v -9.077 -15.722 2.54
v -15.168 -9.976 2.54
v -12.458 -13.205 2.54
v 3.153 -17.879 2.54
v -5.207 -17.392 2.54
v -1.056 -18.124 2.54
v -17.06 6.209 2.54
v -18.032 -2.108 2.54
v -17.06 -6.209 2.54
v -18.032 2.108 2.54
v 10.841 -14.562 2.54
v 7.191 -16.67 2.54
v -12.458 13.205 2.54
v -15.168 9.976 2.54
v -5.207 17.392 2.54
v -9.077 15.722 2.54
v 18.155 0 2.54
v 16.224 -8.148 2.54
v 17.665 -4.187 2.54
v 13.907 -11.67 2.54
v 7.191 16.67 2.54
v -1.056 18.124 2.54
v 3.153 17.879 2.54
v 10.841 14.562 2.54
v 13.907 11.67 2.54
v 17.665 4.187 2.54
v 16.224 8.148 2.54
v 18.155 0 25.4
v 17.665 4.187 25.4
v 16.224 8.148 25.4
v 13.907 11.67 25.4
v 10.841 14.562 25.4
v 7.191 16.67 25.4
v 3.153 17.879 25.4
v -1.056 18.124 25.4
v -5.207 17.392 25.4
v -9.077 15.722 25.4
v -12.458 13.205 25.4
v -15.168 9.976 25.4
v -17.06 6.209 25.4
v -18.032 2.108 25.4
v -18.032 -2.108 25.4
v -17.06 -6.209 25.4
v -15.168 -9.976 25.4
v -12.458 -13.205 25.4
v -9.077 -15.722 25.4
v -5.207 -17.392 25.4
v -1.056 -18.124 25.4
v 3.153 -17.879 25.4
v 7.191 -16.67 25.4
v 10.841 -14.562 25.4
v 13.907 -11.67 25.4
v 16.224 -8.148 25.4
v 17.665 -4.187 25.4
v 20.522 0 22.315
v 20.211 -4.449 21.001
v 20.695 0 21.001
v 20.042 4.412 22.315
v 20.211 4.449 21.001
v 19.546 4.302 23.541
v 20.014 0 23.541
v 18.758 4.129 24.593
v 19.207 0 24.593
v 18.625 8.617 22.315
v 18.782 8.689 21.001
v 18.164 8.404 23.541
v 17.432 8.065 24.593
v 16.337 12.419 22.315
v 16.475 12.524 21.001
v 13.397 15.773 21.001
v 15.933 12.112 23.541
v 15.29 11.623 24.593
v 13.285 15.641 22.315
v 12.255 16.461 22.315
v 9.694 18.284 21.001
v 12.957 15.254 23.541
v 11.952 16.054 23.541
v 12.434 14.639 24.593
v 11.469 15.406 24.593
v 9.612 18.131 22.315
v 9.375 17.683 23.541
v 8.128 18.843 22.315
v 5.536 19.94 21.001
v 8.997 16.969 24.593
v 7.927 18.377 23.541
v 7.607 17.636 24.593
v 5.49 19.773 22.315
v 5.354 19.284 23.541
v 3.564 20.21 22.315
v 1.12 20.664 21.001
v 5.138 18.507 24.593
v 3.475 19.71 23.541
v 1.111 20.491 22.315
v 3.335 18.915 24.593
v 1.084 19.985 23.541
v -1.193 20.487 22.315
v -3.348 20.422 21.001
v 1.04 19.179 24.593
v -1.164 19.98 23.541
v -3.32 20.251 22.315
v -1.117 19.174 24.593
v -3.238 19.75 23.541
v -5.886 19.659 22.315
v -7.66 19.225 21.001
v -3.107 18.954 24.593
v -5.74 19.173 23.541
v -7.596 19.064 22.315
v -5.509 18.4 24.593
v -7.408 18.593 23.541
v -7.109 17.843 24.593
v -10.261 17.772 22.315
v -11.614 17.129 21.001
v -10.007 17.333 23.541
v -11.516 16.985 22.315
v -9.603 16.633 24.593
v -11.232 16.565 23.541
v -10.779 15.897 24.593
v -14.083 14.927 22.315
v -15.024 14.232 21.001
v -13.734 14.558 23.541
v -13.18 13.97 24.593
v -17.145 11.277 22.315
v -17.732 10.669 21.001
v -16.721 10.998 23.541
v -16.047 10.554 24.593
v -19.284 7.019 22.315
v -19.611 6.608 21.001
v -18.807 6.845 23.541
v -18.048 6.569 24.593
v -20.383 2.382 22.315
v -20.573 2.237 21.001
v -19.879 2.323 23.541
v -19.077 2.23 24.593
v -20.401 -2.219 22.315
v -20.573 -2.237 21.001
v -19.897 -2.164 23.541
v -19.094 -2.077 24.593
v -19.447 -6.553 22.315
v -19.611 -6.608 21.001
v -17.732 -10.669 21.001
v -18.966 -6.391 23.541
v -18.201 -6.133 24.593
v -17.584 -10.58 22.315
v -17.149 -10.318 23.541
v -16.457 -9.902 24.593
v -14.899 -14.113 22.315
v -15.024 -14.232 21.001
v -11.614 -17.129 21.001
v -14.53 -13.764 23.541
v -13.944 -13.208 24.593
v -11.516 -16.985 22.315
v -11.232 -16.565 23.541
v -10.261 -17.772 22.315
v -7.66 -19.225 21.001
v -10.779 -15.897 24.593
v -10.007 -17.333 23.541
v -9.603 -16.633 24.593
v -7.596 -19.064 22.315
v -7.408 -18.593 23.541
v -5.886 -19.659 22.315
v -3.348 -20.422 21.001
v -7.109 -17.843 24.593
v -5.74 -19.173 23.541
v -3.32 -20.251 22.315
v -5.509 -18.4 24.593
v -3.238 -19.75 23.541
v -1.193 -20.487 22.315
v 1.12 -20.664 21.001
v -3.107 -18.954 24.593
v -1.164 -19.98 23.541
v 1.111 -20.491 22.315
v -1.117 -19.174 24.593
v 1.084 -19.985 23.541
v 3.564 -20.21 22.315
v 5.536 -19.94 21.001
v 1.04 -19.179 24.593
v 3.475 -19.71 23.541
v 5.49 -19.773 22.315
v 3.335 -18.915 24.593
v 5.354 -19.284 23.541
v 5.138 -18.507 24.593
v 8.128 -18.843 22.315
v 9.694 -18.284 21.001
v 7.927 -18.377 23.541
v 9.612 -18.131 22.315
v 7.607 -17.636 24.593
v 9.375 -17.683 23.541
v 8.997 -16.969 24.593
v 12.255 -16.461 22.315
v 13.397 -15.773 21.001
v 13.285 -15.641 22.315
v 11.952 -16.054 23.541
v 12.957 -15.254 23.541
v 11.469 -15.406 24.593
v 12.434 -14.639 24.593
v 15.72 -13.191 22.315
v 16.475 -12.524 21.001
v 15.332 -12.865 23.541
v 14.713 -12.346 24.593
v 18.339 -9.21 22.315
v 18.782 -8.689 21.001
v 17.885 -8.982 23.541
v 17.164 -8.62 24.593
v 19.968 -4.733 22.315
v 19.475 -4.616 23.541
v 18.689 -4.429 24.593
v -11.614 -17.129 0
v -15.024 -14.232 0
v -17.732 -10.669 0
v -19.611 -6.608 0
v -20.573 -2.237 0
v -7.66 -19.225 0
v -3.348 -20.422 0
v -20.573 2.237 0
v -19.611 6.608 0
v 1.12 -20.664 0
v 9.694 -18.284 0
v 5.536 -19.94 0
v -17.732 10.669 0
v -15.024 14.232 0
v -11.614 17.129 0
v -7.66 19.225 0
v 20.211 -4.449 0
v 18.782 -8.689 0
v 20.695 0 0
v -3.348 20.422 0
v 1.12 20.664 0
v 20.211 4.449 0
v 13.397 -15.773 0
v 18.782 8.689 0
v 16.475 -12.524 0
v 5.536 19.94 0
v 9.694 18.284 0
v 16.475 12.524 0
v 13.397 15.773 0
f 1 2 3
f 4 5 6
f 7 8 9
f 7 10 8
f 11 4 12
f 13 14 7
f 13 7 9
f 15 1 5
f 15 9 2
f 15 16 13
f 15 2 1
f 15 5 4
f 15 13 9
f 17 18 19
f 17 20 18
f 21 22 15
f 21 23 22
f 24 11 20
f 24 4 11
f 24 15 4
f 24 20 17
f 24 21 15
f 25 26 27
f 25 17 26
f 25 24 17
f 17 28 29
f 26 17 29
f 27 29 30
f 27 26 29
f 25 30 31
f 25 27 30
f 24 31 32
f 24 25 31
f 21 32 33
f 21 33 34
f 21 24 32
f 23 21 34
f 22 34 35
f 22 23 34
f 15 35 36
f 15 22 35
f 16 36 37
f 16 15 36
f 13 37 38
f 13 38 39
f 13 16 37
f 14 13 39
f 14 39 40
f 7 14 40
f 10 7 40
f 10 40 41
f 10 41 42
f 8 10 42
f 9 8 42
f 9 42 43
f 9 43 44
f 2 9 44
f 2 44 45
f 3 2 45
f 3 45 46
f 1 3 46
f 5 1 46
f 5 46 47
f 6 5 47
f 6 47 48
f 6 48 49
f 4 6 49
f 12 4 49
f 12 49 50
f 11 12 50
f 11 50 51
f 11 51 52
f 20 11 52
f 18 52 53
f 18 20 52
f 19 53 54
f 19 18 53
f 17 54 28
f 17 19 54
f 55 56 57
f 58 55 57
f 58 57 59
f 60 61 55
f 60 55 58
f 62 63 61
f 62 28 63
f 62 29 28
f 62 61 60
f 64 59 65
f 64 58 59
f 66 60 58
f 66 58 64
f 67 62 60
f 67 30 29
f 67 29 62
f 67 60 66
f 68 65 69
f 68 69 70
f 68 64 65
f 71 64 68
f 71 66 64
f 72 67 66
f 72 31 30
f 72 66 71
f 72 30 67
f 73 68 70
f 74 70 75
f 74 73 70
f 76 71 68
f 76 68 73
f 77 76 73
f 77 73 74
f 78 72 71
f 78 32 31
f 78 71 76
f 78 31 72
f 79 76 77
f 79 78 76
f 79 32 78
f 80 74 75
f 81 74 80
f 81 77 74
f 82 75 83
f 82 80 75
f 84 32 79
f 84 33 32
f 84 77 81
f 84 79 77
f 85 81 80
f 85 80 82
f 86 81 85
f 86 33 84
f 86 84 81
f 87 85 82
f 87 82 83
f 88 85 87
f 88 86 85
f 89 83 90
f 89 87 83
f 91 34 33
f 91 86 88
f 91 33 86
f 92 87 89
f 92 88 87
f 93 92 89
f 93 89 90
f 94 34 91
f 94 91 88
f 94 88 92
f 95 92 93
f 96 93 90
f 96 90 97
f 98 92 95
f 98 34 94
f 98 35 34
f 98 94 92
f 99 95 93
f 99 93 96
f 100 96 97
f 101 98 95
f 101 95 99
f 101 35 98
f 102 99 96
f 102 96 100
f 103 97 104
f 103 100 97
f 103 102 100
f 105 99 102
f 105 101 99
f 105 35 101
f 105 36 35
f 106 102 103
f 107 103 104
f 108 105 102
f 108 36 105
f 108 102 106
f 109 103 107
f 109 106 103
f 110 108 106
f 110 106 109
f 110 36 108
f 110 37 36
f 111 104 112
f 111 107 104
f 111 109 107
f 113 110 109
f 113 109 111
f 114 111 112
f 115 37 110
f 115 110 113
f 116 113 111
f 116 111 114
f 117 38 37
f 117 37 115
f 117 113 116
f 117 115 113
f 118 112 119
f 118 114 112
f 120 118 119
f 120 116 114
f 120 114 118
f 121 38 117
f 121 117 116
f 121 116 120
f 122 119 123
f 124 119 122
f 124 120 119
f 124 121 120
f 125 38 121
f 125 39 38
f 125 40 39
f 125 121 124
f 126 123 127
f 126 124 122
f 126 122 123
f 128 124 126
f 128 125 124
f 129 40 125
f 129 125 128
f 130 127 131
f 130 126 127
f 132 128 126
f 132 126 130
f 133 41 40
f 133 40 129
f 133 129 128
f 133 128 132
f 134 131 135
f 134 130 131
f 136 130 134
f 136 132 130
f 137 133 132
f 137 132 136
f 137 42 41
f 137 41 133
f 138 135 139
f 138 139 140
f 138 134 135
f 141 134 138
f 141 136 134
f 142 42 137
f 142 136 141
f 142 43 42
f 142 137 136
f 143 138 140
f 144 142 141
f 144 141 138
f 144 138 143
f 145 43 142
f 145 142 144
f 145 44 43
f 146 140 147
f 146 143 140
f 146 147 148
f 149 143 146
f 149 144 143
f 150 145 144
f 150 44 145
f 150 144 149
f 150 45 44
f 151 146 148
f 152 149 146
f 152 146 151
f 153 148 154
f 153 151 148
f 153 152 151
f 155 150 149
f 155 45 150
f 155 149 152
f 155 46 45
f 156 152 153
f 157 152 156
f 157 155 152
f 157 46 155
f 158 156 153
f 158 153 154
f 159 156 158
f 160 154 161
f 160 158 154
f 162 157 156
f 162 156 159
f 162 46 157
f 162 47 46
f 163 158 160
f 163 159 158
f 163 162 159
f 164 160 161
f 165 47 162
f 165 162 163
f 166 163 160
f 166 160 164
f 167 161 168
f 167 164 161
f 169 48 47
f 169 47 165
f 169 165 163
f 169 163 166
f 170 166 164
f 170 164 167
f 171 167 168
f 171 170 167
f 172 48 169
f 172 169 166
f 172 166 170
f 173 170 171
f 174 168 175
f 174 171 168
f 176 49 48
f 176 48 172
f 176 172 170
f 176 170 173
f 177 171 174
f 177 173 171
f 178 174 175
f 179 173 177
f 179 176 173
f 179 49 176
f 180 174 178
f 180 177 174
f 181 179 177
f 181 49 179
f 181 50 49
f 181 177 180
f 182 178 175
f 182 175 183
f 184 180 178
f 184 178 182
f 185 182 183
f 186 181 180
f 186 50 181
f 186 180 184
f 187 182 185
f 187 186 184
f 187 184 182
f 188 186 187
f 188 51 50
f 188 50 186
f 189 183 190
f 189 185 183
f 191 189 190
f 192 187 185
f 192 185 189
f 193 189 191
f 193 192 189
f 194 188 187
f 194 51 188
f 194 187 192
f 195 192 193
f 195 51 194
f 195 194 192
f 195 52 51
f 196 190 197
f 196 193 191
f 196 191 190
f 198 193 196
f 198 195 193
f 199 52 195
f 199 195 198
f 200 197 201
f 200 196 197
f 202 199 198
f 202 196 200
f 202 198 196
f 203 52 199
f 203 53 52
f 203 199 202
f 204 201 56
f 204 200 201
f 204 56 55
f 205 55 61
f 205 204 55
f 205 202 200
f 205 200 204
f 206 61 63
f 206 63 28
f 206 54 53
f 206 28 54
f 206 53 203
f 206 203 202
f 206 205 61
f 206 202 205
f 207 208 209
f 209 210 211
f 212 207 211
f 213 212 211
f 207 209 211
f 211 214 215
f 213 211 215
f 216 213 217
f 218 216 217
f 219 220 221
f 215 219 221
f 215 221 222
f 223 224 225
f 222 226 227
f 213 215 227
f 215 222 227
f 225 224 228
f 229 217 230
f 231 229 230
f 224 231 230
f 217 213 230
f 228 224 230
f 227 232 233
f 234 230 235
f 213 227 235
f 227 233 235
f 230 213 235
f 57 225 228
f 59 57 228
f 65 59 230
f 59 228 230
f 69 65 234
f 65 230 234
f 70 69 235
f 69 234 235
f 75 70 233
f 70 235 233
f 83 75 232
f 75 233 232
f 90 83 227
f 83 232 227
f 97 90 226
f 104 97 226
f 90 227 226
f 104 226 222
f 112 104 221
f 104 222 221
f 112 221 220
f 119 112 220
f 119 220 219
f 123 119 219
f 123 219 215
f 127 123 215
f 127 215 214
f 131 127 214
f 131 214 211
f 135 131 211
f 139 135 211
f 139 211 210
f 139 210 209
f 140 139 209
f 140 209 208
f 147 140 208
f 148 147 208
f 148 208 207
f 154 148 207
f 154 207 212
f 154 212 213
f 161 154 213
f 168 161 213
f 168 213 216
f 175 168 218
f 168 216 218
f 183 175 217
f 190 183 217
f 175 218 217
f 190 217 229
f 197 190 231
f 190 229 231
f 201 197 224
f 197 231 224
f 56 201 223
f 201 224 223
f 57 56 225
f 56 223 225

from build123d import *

# Parameters (mm, degrees)
F0_R     = 20.6945995874
F1_DEPTH = 25.4
F2_T     = -2.54


# Not quite as in the source:
# - a fillet or chamfer that OpenCascade refuses, or shapes differently, is made with other operations: its cross-section is extruded or revolved along the edge and cut away or added


with BuildPart() as f1:
    # F0 (on Top) → F1 (new body)
    with BuildSketch(Plane.XY):
        Circle(F0_R)
    extrude(amount=F1_DEPTH)

    # F2
    f2_openings = [f1.faces().sort_by_distance(p)[0] for p in [
        (0, 0, 25.4),
    ]]
    offset(amount=F2_T, openings=f2_openings)

    # F3: fillet of radius 5.08 on 1 edges, made by hand

    # F3_s1 → F3_t2 (revolve, cut)
    with BuildSketch(Plane.XZ):
        with BuildLine():
            ThreePointArc((20.6945995874, 21.0005909488), (20.0140086386, 23.5405909488), (18.1545995874, 25.4))
            Line((18.1545995874, 25.4), (20.6945995874, 25.4))
            Line((20.6945995874, 25.4), (20.6945995874, 21.0005909488))
        make_face()
    revolve(axis=Axis((0, 0, 25.4), (0, 0, 1)), mode=Mode.SUBTRACT)


solid = f1.part
